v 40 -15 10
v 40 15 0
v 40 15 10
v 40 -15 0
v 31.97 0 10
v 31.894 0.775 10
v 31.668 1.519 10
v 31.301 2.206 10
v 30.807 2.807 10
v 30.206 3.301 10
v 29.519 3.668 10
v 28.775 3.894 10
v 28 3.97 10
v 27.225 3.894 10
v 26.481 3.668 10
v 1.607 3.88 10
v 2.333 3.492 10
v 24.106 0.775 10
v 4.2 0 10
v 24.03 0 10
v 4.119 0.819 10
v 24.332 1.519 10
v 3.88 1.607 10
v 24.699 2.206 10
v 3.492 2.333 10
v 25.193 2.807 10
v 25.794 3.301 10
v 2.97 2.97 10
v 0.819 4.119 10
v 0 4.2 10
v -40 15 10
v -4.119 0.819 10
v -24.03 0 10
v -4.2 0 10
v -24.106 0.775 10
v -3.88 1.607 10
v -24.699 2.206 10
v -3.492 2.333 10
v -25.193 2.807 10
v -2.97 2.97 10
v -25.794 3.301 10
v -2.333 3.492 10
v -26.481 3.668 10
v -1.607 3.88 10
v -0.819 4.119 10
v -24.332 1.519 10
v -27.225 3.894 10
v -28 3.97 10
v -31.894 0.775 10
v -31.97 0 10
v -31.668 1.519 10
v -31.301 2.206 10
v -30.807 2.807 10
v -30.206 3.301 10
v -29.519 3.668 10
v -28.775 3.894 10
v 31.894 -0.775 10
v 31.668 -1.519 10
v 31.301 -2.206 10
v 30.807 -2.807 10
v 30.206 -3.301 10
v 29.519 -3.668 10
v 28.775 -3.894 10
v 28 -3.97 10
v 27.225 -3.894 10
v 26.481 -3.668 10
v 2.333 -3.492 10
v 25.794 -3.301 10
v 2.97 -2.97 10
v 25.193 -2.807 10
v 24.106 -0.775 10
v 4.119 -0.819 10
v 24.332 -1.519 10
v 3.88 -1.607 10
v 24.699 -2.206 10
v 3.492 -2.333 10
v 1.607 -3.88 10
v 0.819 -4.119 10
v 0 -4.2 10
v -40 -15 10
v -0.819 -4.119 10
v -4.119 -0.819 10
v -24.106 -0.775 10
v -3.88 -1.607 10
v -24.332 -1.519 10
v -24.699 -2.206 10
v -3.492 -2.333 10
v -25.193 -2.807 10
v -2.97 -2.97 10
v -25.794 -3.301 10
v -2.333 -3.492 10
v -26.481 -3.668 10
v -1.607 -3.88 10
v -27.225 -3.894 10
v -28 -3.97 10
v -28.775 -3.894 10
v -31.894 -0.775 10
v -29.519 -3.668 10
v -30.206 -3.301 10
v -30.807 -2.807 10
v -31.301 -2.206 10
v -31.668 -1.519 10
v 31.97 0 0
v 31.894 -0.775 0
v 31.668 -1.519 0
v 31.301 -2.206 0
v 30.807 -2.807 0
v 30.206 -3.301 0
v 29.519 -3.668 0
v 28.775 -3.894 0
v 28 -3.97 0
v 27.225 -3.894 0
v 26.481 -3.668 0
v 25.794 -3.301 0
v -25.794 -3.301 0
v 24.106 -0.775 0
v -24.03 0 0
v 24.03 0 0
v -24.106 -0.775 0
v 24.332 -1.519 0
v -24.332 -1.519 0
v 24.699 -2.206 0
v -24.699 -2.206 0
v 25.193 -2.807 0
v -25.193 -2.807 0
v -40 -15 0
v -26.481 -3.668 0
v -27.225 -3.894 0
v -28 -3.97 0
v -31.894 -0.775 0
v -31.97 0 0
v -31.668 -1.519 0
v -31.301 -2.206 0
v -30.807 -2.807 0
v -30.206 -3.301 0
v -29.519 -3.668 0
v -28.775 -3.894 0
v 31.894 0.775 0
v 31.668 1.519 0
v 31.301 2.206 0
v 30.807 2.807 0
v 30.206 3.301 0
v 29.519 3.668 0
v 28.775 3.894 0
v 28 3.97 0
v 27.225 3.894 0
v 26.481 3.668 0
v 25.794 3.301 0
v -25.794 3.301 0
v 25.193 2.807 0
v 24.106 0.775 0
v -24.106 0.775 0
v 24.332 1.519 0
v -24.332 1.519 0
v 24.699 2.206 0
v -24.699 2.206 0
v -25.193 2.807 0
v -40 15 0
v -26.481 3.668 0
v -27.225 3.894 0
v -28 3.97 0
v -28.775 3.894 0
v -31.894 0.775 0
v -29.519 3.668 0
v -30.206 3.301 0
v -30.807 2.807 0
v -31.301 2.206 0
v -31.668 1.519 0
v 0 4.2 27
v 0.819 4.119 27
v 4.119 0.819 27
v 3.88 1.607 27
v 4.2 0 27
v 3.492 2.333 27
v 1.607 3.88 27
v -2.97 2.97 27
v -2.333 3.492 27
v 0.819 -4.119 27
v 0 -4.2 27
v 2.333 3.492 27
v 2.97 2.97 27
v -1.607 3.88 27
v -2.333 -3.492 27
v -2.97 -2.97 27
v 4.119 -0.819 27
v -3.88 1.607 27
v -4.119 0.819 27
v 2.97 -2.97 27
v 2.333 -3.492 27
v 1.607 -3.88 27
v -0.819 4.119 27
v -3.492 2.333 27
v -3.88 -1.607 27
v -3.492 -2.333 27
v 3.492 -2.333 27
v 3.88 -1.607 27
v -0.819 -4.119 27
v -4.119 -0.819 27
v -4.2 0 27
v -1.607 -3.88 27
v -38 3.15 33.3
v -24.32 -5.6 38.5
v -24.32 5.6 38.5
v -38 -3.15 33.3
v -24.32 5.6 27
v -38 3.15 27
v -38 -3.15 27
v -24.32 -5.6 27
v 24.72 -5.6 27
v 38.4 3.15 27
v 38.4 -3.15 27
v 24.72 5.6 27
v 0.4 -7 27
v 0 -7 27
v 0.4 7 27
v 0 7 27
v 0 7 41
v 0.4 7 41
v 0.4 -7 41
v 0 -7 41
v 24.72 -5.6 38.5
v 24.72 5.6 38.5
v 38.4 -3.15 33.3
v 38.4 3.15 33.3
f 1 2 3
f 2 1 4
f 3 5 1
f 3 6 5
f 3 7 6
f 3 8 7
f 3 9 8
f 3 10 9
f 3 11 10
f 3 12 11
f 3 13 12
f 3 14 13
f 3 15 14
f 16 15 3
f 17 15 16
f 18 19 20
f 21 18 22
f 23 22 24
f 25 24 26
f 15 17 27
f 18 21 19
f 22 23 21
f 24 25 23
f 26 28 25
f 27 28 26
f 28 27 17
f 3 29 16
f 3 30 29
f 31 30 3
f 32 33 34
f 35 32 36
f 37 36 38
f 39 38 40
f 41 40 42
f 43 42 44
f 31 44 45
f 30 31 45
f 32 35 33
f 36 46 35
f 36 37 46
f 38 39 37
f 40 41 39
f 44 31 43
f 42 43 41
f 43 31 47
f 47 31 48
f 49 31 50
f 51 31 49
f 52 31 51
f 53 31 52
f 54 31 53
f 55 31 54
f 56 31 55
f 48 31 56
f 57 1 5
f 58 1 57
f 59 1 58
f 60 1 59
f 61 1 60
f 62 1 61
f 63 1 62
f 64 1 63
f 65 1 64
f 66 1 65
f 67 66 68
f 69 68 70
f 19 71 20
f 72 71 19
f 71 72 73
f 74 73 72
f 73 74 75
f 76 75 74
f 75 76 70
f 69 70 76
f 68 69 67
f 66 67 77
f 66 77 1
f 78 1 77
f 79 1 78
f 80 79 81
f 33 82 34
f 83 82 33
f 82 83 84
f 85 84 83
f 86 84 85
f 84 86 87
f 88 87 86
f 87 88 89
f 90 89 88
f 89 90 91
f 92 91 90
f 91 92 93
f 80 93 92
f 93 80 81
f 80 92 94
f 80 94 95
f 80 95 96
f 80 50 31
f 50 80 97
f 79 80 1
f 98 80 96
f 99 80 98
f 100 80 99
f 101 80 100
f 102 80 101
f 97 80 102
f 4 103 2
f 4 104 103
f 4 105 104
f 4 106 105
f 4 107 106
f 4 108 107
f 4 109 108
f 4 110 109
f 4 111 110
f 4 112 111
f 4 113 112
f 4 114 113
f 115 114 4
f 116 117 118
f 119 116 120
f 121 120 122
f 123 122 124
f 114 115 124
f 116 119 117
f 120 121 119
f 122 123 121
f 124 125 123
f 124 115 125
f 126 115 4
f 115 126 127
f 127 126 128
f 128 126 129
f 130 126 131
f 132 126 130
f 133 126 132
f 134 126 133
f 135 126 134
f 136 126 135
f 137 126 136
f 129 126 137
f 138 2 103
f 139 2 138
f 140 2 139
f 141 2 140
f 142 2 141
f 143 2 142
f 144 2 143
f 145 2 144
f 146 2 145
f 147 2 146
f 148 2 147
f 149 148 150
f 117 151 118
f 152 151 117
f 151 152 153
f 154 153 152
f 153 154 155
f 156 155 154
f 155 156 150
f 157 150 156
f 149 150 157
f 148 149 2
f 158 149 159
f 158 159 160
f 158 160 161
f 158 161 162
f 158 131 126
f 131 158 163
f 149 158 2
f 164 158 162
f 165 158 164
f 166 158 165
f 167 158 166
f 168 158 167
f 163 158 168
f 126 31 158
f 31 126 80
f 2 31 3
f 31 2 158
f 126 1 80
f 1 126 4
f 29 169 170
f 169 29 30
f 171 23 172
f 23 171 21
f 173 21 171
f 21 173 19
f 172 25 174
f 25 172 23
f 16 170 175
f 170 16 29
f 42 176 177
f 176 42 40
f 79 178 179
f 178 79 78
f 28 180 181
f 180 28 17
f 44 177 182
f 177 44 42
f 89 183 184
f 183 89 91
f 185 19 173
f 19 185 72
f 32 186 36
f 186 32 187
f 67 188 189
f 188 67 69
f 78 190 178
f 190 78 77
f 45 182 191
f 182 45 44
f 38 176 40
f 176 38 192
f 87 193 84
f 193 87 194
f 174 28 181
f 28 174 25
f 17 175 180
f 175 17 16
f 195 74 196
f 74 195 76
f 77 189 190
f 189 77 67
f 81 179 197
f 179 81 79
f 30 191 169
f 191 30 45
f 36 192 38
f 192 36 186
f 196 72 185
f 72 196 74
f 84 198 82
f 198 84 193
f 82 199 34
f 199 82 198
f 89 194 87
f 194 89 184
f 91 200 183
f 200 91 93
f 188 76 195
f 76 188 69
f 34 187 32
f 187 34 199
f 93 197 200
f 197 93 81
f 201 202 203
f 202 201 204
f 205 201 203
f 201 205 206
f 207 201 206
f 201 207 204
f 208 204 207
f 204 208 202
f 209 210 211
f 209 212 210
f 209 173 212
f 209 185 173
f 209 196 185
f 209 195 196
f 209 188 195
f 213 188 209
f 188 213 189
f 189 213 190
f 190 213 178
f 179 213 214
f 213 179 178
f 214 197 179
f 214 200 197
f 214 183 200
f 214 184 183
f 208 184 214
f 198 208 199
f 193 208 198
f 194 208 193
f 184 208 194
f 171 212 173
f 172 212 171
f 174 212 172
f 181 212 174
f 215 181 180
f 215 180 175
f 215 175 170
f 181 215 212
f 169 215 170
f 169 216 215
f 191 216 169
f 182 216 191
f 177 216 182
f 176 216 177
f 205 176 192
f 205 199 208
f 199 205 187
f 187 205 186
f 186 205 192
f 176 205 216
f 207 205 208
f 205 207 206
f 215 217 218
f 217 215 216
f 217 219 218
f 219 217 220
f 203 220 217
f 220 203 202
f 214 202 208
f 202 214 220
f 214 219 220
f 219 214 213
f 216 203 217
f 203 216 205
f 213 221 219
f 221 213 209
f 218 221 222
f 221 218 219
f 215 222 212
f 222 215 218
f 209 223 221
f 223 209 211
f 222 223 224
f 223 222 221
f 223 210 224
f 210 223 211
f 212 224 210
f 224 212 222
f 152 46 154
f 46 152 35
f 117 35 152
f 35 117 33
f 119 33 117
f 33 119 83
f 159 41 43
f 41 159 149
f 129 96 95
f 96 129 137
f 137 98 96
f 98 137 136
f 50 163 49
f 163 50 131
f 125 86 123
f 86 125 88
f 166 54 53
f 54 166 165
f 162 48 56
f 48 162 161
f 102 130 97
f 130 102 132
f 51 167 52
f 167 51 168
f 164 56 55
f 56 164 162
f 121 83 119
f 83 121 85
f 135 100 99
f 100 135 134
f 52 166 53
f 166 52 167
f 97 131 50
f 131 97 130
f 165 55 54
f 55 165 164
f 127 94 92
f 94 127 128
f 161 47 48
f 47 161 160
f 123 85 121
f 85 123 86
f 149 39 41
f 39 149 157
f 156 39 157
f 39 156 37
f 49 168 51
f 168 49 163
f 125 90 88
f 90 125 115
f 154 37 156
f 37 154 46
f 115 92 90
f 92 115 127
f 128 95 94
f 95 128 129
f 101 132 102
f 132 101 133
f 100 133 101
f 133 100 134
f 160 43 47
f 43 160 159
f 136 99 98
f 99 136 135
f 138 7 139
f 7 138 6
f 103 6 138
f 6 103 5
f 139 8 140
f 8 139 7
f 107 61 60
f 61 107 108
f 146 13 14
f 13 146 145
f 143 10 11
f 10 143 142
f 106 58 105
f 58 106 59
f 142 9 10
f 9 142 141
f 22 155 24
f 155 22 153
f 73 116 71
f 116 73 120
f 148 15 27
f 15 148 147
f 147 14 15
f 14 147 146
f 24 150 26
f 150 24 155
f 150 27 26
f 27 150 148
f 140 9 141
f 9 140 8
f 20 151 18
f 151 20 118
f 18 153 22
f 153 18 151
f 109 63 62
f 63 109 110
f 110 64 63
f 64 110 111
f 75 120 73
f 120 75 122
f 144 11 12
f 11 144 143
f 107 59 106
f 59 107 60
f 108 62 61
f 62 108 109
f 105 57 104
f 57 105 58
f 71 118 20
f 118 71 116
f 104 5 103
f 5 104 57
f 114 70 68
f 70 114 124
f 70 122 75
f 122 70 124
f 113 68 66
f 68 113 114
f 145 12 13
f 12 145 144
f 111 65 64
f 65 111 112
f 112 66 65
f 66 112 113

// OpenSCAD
$fn = 32;

// ----------------------------------------------------------------------
// Boat cleat: 80 mm base, horn 34 mm up
// ----------------------------------------------------------------------

// --- parameters (mm) ---
base_l = 80;              // base length
base_w = 30;              // base width
base_t = 10;              // base thickness
horn_len = 76;            // horn length
horn_d = 14;              // horn diameter at the middle
horn_z = 34;              // horn axis height
end_drop = 10;            // how far the horn tips drop
post_d = 8.4;             // centre post diameter
holes_d = 7.94;           // fixing holes
hole_x = 28;              // fixing hole spacing

difference() {
  union() {
    translate([-40, -15, 0]) cube([base_l, base_w, base_t]);
    /* centre post, sunk 1 mm into the base */
    translate([0, 0, 9]) cylinder(h = 25, d = post_d);
    /* horn: a hull chain of boxes, full in the middle and lighter at the tips */
    hull() {
      translate([-38, -3.15, 27]) cube([0.4, 6.3, 6.3], center = false);
      translate([-24.32, -5.6, 27]) cube([0.4, 11.2, 11.5], center = false);
    }
    hull() {
      translate([-24.32, -5.6, 27]) cube([0.4, 11.2, 11.5], center = false);
      translate([0, -7, 27]) cube([0.4, 14, 14], center = false);
    }
    hull() {
      translate([0, -7, 27]) cube([0.4, 14, 14], center = false);
      translate([24.32, -5.6, 27]) cube([0.4, 11.2, 11.5], center = false);
    }
    hull() {
      translate([24.32, -5.6, 27]) cube([0.4, 11.2, 11.5], center = false);
      translate([38, -3.15, 27]) cube([0.4, 6.3, 6.3], center = false);
    }
  }
  translate([-28, 0, -2.5]) cylinder(h = base_t + 5, d = holes_d);
  translate([28, 0, -2.5]) cylinder(h = base_t + 5, d = holes_d);
}
